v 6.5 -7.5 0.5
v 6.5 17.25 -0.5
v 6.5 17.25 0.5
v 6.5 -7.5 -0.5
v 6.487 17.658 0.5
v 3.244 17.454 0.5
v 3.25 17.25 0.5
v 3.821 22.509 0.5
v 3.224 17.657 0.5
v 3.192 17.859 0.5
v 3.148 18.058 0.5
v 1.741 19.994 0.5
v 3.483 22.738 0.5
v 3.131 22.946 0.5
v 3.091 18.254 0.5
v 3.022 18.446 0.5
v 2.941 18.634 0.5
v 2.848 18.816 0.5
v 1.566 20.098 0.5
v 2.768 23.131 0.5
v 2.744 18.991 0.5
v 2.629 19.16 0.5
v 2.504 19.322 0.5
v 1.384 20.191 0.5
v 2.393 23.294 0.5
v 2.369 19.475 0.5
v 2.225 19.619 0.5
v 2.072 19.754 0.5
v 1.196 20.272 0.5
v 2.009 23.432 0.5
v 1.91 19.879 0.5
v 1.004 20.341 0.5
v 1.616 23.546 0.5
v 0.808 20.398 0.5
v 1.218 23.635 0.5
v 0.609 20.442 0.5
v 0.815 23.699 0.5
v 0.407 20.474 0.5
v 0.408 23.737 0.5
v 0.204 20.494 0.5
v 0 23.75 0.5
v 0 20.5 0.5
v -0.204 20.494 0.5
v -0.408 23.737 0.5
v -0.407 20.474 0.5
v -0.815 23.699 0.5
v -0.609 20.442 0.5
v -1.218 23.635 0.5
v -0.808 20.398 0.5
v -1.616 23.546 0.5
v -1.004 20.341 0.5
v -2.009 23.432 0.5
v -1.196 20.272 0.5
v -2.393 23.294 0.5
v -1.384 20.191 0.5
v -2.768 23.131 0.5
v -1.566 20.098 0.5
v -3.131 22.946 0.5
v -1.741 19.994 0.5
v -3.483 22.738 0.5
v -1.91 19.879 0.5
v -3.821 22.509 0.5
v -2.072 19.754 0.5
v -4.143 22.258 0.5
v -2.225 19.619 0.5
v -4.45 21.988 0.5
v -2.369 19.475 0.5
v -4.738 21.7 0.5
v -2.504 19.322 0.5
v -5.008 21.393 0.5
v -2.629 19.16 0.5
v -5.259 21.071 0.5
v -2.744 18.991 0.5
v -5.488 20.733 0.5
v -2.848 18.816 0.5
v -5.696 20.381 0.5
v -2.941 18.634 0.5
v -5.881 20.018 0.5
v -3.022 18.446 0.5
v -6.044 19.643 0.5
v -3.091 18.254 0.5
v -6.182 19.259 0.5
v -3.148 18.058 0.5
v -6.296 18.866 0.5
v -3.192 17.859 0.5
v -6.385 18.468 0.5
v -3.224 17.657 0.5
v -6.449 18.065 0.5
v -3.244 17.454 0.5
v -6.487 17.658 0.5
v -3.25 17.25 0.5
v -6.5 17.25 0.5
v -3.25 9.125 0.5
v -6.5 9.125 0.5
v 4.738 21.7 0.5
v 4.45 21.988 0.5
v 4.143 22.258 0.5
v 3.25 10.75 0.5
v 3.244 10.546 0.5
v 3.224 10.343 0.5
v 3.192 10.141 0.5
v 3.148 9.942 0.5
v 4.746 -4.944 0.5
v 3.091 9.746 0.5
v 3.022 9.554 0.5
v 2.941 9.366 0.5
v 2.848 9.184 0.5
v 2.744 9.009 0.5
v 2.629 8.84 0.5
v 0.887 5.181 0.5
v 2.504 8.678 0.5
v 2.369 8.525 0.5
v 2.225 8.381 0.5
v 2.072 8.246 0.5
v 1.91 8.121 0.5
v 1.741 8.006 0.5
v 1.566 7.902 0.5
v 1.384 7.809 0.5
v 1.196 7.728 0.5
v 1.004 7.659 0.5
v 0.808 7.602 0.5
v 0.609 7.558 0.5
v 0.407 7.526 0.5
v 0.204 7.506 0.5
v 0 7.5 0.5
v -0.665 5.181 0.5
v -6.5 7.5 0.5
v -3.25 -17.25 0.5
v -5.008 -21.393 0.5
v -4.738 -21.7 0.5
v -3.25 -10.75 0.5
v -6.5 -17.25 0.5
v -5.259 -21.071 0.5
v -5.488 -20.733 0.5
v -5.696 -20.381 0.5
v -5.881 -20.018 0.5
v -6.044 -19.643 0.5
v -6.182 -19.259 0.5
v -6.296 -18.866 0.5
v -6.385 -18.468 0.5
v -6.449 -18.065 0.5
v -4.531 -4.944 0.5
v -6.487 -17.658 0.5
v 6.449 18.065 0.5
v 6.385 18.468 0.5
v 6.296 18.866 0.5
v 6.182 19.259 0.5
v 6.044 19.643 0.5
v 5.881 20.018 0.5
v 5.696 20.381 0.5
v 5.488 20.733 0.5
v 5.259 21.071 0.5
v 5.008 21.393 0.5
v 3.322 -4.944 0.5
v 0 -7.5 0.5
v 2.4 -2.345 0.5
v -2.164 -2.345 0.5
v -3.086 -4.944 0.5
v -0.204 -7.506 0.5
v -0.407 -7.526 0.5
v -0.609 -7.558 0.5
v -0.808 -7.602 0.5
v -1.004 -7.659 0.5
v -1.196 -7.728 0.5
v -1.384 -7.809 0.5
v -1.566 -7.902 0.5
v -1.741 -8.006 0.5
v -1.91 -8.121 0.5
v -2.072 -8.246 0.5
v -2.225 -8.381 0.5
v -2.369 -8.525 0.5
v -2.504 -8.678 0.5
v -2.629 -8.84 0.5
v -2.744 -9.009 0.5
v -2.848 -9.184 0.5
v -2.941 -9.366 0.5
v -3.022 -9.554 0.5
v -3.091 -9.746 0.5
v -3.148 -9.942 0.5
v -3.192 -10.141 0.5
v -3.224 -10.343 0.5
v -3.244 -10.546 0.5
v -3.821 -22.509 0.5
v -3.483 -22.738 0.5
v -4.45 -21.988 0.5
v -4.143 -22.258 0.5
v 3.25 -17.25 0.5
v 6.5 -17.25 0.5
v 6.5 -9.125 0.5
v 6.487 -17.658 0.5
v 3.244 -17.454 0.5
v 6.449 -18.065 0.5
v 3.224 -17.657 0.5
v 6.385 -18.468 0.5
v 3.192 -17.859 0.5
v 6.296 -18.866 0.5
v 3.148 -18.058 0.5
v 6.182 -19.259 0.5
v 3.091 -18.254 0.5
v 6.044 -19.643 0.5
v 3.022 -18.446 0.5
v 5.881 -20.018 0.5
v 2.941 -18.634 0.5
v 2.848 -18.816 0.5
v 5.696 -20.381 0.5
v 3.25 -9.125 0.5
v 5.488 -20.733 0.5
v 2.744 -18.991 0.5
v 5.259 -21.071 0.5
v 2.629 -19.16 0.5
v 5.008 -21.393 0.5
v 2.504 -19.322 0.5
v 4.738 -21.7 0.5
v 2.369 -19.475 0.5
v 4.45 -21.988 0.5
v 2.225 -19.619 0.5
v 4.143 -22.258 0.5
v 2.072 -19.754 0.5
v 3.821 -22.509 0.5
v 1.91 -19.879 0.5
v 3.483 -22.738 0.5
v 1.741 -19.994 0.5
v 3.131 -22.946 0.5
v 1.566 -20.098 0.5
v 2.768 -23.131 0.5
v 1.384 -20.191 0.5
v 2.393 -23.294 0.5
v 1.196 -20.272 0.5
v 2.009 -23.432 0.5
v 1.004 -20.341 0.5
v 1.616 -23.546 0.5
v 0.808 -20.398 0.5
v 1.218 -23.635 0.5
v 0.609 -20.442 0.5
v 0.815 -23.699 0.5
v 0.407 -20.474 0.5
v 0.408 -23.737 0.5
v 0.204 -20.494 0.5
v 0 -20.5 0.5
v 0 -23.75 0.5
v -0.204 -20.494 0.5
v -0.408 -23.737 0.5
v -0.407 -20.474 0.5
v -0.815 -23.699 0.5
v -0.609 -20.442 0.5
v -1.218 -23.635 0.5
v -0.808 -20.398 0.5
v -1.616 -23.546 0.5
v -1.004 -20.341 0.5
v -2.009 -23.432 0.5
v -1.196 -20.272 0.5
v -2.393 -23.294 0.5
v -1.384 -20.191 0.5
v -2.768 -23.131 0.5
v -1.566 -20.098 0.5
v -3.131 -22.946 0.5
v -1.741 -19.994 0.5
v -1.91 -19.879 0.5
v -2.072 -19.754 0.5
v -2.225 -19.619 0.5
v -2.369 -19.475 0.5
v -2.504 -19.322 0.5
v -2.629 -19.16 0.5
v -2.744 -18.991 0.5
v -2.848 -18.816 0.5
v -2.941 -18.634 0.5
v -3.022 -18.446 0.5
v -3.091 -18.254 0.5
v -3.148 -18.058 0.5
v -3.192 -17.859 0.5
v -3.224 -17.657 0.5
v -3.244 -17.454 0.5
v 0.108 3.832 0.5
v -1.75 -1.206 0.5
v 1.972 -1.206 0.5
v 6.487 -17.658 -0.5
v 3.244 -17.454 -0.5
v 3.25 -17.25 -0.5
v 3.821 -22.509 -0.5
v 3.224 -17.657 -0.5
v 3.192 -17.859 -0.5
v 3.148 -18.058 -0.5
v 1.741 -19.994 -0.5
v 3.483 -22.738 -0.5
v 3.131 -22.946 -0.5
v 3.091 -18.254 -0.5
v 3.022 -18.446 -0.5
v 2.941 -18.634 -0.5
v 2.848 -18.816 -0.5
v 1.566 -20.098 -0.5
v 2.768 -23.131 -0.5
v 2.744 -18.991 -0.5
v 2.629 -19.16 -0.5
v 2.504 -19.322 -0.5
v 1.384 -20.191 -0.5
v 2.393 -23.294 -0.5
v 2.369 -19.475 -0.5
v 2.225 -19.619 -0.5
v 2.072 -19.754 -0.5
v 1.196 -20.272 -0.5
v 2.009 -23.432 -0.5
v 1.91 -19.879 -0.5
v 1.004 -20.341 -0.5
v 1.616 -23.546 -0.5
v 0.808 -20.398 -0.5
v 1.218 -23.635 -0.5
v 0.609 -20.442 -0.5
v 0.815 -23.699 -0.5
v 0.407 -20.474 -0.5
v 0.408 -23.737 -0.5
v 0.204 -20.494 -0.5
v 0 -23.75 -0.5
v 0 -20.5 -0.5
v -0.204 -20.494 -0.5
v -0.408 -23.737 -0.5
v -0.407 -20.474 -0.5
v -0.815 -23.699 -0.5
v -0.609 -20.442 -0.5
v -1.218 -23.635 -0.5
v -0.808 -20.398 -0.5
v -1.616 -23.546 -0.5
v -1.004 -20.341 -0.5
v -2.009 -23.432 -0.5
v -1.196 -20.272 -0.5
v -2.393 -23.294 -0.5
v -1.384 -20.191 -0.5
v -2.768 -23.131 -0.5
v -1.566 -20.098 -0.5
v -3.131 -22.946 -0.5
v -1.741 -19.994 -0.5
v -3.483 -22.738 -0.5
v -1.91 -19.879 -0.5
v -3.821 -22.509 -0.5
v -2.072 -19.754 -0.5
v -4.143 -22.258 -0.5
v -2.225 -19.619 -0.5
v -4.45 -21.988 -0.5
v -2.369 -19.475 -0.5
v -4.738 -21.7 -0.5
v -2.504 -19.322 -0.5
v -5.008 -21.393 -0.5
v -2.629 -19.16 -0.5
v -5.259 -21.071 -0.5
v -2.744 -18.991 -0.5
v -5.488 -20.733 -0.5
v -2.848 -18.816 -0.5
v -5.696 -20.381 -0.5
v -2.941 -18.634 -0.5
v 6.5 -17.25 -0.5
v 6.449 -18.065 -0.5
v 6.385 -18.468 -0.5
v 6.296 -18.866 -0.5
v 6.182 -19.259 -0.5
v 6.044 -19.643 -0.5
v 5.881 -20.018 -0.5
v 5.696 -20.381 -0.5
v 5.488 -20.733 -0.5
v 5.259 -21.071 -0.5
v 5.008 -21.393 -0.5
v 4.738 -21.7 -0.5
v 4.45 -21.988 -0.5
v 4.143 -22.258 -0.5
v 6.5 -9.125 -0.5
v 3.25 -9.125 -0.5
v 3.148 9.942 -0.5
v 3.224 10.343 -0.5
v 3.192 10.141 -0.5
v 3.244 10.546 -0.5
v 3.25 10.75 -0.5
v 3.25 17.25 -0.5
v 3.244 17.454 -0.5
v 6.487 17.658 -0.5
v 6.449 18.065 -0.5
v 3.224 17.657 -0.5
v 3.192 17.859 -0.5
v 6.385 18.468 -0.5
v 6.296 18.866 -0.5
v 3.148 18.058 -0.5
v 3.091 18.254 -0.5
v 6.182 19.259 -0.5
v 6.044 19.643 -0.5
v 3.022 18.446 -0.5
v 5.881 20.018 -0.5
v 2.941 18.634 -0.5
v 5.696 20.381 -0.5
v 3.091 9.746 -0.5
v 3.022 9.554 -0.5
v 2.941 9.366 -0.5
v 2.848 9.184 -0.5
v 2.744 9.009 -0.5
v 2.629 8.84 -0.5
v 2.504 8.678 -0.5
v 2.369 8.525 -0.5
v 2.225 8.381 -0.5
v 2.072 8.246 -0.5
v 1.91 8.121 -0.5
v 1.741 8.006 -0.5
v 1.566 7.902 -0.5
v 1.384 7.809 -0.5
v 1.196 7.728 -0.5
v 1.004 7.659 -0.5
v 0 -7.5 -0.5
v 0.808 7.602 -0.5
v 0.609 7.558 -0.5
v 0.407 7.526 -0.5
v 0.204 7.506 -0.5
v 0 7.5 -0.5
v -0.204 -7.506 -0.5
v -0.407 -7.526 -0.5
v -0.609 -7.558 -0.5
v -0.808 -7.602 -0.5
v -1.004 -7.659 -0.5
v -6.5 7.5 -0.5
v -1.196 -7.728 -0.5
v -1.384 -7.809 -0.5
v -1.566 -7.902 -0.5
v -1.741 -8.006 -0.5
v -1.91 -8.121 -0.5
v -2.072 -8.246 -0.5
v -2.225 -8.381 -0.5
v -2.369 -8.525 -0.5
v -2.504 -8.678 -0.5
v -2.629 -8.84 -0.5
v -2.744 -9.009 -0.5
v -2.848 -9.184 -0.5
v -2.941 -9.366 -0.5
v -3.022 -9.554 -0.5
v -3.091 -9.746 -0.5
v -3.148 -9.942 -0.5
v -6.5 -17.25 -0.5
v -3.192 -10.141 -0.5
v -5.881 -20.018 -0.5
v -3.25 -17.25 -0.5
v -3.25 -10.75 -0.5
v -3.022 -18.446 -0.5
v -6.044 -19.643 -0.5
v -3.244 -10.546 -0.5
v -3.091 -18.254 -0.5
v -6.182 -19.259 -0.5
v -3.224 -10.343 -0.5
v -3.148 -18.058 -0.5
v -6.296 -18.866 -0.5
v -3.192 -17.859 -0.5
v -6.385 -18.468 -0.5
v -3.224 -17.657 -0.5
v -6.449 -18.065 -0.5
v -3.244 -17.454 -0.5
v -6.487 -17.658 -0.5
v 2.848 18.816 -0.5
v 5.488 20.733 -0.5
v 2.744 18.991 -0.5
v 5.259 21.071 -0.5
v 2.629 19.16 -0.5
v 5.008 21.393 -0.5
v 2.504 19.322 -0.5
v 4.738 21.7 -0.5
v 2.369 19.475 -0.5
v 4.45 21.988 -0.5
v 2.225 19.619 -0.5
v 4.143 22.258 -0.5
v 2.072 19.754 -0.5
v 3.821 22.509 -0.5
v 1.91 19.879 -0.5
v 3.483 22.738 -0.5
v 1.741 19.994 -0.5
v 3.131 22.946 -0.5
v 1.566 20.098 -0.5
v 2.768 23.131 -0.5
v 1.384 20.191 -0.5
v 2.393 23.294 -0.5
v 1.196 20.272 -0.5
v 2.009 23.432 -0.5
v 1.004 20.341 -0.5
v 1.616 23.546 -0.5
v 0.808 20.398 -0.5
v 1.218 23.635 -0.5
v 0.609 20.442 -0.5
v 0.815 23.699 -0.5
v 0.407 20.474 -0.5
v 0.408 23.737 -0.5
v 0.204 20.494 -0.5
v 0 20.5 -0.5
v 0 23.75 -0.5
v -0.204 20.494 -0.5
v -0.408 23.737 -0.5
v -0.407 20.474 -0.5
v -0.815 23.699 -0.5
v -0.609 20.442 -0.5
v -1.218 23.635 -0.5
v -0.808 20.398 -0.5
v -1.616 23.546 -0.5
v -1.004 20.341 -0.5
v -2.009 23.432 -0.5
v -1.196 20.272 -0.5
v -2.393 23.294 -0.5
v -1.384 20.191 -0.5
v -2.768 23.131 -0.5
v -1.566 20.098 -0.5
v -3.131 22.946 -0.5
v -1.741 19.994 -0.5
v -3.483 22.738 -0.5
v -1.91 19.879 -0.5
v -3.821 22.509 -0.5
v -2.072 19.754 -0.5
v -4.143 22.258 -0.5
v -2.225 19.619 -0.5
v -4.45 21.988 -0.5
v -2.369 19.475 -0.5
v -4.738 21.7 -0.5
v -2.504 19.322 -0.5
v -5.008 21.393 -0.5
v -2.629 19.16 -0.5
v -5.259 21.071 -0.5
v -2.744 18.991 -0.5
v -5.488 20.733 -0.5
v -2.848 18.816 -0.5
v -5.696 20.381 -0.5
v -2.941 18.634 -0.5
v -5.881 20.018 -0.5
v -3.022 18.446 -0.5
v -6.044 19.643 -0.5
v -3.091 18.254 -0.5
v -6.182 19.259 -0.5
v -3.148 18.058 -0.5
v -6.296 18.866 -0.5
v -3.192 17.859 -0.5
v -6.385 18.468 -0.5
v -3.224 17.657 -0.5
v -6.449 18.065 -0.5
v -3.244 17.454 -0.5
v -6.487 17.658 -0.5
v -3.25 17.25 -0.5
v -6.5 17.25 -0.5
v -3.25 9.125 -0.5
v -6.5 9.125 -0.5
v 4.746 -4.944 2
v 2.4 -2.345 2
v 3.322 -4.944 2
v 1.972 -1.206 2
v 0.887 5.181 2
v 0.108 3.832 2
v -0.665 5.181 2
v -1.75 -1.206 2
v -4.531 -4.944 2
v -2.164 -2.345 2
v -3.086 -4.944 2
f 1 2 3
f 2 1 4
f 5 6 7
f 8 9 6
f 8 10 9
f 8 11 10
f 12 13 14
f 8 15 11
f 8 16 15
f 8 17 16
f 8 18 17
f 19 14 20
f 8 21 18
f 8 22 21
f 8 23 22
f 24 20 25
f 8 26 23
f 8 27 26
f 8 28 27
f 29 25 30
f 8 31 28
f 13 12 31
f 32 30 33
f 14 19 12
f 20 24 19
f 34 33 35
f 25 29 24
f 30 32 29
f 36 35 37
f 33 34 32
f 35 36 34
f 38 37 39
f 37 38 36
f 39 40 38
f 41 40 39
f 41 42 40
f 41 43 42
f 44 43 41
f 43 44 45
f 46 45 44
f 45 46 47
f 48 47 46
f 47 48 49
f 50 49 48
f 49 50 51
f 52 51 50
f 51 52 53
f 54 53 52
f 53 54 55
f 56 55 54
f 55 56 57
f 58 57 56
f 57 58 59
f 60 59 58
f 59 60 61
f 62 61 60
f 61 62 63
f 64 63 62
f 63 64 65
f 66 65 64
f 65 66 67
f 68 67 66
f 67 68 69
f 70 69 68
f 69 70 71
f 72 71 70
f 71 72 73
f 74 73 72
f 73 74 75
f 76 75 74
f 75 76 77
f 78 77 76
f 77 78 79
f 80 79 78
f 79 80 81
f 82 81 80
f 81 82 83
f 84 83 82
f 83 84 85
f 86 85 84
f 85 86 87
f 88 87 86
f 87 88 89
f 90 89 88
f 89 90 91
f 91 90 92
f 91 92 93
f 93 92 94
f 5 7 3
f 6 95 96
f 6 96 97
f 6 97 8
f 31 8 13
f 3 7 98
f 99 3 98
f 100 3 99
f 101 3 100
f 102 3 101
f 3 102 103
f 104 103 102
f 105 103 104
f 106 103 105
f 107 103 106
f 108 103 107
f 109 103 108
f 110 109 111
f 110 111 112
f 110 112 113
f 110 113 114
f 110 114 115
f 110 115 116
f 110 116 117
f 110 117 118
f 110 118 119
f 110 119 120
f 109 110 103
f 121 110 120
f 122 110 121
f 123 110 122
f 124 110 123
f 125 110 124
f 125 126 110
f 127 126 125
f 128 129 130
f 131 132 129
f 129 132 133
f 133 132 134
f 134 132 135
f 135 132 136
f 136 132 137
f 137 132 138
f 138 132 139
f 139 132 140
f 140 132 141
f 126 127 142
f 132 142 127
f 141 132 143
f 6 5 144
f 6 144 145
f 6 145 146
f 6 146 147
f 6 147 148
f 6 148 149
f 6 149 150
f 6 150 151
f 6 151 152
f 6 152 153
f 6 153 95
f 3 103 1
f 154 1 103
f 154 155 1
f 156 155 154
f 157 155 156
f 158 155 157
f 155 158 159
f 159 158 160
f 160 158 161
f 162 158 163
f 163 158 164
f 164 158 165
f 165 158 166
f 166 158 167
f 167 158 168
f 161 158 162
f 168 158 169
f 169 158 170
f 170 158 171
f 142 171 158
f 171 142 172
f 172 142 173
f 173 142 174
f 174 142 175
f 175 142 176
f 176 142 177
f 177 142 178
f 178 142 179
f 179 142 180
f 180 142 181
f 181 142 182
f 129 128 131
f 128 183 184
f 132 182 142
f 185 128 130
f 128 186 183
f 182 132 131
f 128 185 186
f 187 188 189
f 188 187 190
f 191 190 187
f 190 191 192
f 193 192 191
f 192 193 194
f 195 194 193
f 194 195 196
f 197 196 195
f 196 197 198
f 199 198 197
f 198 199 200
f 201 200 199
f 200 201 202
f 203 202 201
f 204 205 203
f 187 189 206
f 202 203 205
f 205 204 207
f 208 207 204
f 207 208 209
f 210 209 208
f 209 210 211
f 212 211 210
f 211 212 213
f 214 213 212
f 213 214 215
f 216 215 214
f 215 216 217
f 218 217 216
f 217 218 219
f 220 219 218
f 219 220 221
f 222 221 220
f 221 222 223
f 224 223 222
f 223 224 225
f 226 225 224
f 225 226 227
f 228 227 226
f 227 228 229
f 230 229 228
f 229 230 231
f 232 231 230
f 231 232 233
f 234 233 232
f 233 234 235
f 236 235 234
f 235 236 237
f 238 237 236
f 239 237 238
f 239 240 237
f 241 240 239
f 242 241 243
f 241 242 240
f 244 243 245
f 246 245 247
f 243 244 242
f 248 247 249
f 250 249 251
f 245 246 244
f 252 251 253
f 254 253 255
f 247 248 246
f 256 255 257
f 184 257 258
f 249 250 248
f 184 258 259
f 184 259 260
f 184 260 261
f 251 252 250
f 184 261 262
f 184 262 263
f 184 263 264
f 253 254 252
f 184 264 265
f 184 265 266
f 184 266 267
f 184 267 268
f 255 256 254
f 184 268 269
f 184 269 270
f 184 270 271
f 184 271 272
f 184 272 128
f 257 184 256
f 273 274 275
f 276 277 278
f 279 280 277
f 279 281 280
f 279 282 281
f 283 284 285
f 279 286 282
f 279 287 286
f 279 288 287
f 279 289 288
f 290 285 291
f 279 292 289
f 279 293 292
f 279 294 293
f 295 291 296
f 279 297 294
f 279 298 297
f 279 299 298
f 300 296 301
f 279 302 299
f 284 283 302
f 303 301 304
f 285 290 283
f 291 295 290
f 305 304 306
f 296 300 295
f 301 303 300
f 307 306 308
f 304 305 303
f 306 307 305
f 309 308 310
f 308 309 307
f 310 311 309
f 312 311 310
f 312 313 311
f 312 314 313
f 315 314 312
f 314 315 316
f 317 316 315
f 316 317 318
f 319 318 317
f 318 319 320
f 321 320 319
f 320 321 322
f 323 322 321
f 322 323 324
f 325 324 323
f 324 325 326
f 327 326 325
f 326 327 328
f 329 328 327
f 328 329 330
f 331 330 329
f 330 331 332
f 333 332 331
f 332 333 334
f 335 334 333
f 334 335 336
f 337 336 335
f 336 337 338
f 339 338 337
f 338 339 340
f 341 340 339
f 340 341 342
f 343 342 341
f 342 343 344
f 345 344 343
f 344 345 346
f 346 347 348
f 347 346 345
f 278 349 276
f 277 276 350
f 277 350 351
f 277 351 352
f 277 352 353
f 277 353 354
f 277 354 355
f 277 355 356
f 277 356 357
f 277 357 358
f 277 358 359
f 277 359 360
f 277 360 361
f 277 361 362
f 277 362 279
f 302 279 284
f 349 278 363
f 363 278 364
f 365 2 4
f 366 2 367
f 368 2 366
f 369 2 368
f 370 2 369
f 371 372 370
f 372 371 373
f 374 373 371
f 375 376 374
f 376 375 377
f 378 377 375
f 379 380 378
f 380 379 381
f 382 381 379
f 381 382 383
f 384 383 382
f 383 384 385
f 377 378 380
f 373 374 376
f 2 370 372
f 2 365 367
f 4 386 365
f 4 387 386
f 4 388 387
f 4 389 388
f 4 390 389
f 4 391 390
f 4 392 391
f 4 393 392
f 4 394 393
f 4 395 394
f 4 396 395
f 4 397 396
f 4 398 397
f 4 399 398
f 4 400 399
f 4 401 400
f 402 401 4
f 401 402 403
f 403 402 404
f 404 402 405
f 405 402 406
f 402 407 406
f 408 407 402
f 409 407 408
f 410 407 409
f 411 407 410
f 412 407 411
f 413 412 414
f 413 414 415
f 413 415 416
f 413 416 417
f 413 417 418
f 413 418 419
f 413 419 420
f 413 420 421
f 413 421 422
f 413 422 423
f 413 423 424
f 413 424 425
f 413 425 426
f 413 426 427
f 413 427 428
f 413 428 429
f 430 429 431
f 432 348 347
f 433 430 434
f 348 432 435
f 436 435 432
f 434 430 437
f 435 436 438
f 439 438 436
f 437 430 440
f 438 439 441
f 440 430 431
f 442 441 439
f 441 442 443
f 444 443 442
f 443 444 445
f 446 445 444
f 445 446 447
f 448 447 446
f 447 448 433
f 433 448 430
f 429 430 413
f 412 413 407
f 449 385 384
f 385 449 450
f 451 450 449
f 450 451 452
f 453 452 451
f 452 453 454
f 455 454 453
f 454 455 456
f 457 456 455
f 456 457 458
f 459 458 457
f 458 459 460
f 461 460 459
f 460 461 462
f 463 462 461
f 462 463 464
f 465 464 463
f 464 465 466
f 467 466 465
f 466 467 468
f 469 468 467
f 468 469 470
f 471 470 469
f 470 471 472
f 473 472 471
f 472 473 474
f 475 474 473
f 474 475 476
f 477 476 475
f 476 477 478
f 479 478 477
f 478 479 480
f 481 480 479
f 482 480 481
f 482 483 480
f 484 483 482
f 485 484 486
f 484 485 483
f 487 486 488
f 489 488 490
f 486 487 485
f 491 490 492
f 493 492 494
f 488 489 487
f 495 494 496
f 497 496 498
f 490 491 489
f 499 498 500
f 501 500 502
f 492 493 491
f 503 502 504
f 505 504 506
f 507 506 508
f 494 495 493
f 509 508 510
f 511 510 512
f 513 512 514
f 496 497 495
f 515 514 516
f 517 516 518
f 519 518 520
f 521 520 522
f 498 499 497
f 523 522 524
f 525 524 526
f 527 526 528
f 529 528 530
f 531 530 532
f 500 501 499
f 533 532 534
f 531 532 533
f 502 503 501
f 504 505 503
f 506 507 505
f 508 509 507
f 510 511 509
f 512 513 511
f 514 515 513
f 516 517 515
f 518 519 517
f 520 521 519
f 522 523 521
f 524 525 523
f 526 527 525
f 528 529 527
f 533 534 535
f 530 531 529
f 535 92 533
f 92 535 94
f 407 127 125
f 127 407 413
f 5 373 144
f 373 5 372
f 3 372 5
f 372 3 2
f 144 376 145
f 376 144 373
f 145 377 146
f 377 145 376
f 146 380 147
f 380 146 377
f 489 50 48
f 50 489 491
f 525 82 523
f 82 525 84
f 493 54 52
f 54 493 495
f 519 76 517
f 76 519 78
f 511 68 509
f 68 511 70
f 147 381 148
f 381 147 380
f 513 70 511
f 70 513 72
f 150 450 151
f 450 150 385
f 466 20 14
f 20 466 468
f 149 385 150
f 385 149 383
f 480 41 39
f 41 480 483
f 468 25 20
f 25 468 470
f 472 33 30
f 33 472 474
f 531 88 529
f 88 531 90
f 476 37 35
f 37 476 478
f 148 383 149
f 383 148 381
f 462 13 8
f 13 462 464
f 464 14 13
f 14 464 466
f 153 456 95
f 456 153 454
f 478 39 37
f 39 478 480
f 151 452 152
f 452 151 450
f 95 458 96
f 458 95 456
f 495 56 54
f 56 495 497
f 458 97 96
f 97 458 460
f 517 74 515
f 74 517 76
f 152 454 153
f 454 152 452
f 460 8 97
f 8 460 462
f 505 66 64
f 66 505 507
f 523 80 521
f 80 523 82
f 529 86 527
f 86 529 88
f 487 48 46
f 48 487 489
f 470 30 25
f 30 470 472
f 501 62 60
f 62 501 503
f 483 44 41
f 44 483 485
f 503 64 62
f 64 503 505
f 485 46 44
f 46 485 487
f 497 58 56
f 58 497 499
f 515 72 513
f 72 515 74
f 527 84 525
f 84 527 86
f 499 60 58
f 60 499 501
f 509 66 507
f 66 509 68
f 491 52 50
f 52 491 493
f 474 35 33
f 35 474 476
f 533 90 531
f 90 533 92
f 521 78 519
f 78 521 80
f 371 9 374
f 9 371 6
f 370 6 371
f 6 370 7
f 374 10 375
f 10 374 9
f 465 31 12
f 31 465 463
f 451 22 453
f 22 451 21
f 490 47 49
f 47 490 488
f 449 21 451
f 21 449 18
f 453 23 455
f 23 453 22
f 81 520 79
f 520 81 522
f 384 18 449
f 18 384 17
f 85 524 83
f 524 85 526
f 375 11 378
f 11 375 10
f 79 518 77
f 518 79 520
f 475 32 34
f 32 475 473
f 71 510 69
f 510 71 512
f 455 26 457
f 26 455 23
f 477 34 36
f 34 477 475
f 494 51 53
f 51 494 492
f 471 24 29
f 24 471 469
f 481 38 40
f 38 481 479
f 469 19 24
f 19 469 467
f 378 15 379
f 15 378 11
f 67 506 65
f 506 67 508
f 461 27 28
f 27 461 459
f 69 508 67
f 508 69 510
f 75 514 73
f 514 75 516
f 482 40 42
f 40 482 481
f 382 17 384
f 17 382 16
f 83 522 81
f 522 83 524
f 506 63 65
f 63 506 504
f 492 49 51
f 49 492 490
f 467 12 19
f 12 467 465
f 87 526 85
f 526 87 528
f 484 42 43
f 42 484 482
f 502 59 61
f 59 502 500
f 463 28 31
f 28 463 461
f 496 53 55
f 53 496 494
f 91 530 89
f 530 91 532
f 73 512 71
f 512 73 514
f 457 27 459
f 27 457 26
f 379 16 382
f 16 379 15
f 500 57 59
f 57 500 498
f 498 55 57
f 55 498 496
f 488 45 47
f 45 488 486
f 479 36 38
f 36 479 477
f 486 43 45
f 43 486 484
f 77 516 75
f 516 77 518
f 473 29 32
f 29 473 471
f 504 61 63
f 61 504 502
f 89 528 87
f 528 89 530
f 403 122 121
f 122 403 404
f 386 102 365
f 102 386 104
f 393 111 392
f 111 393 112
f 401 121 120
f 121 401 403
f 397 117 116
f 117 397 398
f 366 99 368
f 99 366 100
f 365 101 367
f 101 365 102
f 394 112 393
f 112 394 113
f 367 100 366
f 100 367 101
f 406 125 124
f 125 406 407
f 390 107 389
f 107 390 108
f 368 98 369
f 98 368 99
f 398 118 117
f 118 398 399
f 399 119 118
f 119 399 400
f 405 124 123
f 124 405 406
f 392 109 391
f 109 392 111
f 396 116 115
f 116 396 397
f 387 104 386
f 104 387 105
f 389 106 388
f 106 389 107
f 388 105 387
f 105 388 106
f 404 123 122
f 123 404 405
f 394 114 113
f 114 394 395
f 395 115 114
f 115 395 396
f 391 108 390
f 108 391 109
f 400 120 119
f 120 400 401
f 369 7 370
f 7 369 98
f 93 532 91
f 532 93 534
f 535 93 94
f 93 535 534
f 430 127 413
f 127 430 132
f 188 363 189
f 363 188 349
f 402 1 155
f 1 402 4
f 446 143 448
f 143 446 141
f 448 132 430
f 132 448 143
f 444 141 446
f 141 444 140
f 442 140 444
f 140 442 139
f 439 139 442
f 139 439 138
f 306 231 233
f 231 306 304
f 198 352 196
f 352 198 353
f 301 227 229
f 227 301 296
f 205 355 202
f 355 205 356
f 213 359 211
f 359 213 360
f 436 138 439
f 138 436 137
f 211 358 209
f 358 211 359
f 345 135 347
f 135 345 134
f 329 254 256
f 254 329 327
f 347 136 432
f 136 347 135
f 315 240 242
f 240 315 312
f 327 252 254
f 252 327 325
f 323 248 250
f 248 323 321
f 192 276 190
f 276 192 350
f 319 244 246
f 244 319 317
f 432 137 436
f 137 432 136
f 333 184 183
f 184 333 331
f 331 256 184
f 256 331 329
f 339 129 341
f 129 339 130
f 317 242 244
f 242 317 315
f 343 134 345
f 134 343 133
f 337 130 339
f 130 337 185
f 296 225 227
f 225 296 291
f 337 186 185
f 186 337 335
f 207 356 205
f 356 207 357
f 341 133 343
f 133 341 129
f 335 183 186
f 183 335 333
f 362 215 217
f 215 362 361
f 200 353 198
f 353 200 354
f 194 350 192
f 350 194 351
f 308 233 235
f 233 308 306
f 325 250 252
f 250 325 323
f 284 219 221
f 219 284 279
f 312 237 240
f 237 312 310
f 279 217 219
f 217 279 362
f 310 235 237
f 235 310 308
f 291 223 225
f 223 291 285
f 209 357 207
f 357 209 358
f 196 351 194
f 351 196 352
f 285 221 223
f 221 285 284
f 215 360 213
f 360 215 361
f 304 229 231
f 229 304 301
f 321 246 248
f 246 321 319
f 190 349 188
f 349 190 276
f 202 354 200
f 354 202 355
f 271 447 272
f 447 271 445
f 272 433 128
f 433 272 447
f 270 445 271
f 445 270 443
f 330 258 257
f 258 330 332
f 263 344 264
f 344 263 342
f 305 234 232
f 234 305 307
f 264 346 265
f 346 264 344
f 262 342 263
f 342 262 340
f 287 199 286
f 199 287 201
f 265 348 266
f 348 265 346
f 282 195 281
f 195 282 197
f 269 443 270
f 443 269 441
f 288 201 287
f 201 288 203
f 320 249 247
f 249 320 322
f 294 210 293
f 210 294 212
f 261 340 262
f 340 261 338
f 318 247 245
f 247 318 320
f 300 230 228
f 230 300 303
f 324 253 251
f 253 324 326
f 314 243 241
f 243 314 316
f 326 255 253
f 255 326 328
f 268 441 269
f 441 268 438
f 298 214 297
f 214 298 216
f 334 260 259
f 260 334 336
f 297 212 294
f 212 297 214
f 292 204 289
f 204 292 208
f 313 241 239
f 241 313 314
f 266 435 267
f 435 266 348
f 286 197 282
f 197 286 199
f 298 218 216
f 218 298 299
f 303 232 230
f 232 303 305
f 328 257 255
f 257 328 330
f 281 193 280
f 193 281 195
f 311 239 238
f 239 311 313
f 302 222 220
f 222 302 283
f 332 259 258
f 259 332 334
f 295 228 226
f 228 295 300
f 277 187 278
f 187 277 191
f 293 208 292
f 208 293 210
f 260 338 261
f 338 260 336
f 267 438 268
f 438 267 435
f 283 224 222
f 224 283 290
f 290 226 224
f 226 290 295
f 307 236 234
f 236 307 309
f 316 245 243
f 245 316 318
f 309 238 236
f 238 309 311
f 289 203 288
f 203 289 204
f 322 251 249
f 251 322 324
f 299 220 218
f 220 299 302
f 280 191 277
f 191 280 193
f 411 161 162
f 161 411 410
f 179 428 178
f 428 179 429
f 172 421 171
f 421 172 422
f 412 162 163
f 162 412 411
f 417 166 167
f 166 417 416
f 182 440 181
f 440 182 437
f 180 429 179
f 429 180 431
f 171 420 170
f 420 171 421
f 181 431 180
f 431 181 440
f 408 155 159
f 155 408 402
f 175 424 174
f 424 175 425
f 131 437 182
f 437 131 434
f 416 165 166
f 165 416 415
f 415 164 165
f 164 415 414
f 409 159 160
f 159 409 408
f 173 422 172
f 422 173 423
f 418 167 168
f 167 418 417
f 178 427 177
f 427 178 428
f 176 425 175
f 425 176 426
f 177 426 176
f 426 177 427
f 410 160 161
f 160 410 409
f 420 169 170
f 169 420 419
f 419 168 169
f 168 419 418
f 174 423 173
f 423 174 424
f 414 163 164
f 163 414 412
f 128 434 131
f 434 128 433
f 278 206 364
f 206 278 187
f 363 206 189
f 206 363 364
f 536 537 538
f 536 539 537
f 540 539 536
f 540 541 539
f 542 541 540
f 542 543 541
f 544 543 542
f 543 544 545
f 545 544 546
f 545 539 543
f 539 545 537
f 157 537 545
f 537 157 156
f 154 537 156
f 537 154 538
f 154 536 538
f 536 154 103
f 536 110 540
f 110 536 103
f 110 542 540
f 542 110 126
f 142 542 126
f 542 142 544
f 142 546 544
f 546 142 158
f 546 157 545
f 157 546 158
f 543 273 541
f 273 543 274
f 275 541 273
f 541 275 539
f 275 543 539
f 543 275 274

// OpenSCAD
//Thanks to wstein and his customizable multiline tag and keychain
//https://www.thingiverse.com/thing:739573
// from where I got the list of fonts


// preview[view:south, tilt:top]

/* [Shape] */
//should be a bit bigger than the actual diameter of your cable (maybe by 1mm)
cable_diameter=6.5;

//the bit between the hooks
main_body_length=15;//[3:150]

//the minimum value for this is twice the cable diameter
main_body_width=13;//[3:150]
//of the body and hooks. This needs to bend around the cable so better to keep this relatively thin (I use 1mm).
thickness=1;//[0.4:0.1:2.5]


/* [Text] */
text="A";
text_thickness=2;
text_size=10;
text_font="Acme"; //[Abril Fatface,Aclonica,Acme,Advent Pro,Akronim,Aladin,Alegreya,Alegreya Sans,Alegreya SC,Alex Brush,Alfa Slab One,Alice,Amaranth,Architects Daughter,Archivo Black,Archivo Narrow,Arimo,Arvo,Asap,Astloch,Asul,Averia Libre,Averia Serif Libre,Bangers,Basic,Belgrano,Berkshire Swash,Bigshot One,Bilbo Swash Caps,Black Ops One,Bonbon,Bowlby One SC,Brawler,Bubblegum Sans,Butterfly Kids,Cabin Condensed,Caesar Dressing,Cagliostro,Calligraffitti,Capriola,Carter One,Changa One,Chango,Chelsea Market,Cherry Cream Soda,Chewy,Chicle,Chivo,Clicker Script,Coming Soon,Concert One,Condiment,Cookie,Courgette,Covered By Your Grace,Crimson Text,Dancing Script,DejaVu Sans,DejaVu Serif,Dhurjati,Doppio One,Dosis,Droid Sans,Eagle Lake,Electrolize,Emilys Candy,Encode Sans,Encode Sans Compressed,Euphoria Script,Exo,Exo 2,Faster One,Federo,Finger Paint,Fjord One,Fontdiner Swanky,Freckle Face,Fruktur,Gabriela,Geo,Germania One,Give You Glory,Gloria Hallelujah,Goudy Bookletter 1911,Graduate,Grand Hotel,Great Vibes,Griffy,Hanalei Fill,Happy Monkey,Henny Penny,Hind,IM Fell English SC,Indie Flower,Irish Grover,Italianno,Jacques Francois Shadow,Jolly Lodger,Josefin Slab,Joti One,Judson,Just Another Hand,Kalam,Kameron,Karma,Kavoon,Knewave,Kranky,Kristi,Laila,Lakki Reddy,Lancelot,Lato,Leckerli One,Ledger,Lekton,Lemon One,Liberation Sans,Libre Caslon Text,Life Savers,Lilita One,Lily Script One,Limelight,Lobster,Lobster Two,Londrina Outline,Londrina Shadow,Londrina Solid,Lora,Love Ya Like A Sister,Loved by the King,Lovers Quarrel,Luckiest Guy,Lusitana,Macondo,Macondo Swash Caps,Mako,Marck Script,Margarine,Marko One,Maven Pro,McLaren,MedievalSharp,Merienda One,Merriweather,Mervale Script,Metal Mania,Metrophobic,Milonga,Miltonian Tattoo,Miss Fajardose,Molle,Montez,Montserrat,Mr De Haviland,Mystery Quest,Neucha,New Rocker,Niconne,Nosifer,Nothing You Could Do,Noto Sans Oriya,Noto Serif,Nova Square,Nunito,Old Standard TT,Oleo Script,Oleo Script Swash Caps,Orbitron,Oregano,Orienta,Original Surfer,Oswald,Over the Rainbow,Overlock,Oxygen,Pacifico,Paprika,Parisienne,Patrick Hand SC,Paytone One,Peralta,Permanent Marker,Piedra,Pirata One,Play,Playball,Poetsen One,Poppins,Press Start 2P,Princess Sofia,PT Mono,Qwigley,Racing Sans One,Raleway,Rancho,Ranga,Ribeye,Roboto,Roboto Condensed,Roboto Slab,Rochester,Rock Salt,Rubik One,Sail,Salsa,Sansita One,Sarina,Satisfy,Schoolbell,Seaweed Script,Sevillana,Shadows Into Light,Shadows Into Light Two,Share,Six Caps,Skranji,Source Sans Pro,Spicy Rice,Stardos Stencil,Stoke,Syncopate,Teko,Terminal Dosis,The Girl Next Door,Tillana,Timmana,Titillium Web,Ubuntu,Ultra,Underdog,UnifrakturCook,UnifrakturMaguntia,Vampiro One,Vidaloka,Viga,Voces,Volkhov,Vollkorn,Voltaire,Waiting for the Sunrise,Wallpoet,Wellfleet,Wendy One,Yellowtail,Yesteryear,Zeyada]

rotate_text="perpendicular";//[perpendicular,parallel]

/* [Hidden] */
$fn=100;
main_body_width_use=max([cable_diameter*2,main_body_width]);
//main body

union()
{
    cube([main_body_width_use,main_body_length,thickness],center=true);
     
    //hook 1
    translate([0,main_body_length/2, 0,])
        hook(cable_diameter,thickness);
    //hook 2
        rotate(180)
            translate([0,main_body_length/2, 0,]) 
                hook(cable_diameter,thickness);
 
    if(rotate_text=="parallel")
    {    linear_extrude(height= text_thickness) 
            rotate(270)
                translate([0,0,thickness/2]) 
                    text(str(text), font = text_font, size = text_size, halign = "center",valign = "center");
    }
    else
    {    linear_extrude(height= text_thickness) 
               translate([0,0,thickness/2]) 
                    text(str(text), font = text_font, size = text_size, halign = "center",valign = "center");
    }

}
module slot(diameter, thickness){

    union()
    {   cylinder(thickness, d=diameter, center=true);
        translate([0,-diameter,0])
            cylinder(thickness, d=diameter, center=true);
        translate([0,-diameter/2,0]) 
            cube ([diameter,diameter,thickness],center=true);
        translate ([-diameter,-diameter*11/8,0])  
            cube ([diameter*2,diameter/4,thickness],center=true);
        translate([-diameter/4,-diameter,0])
            cube([diameter/2,diameter,thickness],center=true);
    }
      
}
module hook(diameter,thickness)
{
     difference(){
       union()
        {
           translate([0,diameter*3/4,0]) 
                cube([diameter*2,diameter*3/2,thickness],center=true);
           translate([0,diameter*3/2,0]) 
                cylinder(thickness, d=diameter*2, center=true);
        }
        translate([0,diameter*3/2,0]) slot(diameter, thickness*2);
    }
        
}
